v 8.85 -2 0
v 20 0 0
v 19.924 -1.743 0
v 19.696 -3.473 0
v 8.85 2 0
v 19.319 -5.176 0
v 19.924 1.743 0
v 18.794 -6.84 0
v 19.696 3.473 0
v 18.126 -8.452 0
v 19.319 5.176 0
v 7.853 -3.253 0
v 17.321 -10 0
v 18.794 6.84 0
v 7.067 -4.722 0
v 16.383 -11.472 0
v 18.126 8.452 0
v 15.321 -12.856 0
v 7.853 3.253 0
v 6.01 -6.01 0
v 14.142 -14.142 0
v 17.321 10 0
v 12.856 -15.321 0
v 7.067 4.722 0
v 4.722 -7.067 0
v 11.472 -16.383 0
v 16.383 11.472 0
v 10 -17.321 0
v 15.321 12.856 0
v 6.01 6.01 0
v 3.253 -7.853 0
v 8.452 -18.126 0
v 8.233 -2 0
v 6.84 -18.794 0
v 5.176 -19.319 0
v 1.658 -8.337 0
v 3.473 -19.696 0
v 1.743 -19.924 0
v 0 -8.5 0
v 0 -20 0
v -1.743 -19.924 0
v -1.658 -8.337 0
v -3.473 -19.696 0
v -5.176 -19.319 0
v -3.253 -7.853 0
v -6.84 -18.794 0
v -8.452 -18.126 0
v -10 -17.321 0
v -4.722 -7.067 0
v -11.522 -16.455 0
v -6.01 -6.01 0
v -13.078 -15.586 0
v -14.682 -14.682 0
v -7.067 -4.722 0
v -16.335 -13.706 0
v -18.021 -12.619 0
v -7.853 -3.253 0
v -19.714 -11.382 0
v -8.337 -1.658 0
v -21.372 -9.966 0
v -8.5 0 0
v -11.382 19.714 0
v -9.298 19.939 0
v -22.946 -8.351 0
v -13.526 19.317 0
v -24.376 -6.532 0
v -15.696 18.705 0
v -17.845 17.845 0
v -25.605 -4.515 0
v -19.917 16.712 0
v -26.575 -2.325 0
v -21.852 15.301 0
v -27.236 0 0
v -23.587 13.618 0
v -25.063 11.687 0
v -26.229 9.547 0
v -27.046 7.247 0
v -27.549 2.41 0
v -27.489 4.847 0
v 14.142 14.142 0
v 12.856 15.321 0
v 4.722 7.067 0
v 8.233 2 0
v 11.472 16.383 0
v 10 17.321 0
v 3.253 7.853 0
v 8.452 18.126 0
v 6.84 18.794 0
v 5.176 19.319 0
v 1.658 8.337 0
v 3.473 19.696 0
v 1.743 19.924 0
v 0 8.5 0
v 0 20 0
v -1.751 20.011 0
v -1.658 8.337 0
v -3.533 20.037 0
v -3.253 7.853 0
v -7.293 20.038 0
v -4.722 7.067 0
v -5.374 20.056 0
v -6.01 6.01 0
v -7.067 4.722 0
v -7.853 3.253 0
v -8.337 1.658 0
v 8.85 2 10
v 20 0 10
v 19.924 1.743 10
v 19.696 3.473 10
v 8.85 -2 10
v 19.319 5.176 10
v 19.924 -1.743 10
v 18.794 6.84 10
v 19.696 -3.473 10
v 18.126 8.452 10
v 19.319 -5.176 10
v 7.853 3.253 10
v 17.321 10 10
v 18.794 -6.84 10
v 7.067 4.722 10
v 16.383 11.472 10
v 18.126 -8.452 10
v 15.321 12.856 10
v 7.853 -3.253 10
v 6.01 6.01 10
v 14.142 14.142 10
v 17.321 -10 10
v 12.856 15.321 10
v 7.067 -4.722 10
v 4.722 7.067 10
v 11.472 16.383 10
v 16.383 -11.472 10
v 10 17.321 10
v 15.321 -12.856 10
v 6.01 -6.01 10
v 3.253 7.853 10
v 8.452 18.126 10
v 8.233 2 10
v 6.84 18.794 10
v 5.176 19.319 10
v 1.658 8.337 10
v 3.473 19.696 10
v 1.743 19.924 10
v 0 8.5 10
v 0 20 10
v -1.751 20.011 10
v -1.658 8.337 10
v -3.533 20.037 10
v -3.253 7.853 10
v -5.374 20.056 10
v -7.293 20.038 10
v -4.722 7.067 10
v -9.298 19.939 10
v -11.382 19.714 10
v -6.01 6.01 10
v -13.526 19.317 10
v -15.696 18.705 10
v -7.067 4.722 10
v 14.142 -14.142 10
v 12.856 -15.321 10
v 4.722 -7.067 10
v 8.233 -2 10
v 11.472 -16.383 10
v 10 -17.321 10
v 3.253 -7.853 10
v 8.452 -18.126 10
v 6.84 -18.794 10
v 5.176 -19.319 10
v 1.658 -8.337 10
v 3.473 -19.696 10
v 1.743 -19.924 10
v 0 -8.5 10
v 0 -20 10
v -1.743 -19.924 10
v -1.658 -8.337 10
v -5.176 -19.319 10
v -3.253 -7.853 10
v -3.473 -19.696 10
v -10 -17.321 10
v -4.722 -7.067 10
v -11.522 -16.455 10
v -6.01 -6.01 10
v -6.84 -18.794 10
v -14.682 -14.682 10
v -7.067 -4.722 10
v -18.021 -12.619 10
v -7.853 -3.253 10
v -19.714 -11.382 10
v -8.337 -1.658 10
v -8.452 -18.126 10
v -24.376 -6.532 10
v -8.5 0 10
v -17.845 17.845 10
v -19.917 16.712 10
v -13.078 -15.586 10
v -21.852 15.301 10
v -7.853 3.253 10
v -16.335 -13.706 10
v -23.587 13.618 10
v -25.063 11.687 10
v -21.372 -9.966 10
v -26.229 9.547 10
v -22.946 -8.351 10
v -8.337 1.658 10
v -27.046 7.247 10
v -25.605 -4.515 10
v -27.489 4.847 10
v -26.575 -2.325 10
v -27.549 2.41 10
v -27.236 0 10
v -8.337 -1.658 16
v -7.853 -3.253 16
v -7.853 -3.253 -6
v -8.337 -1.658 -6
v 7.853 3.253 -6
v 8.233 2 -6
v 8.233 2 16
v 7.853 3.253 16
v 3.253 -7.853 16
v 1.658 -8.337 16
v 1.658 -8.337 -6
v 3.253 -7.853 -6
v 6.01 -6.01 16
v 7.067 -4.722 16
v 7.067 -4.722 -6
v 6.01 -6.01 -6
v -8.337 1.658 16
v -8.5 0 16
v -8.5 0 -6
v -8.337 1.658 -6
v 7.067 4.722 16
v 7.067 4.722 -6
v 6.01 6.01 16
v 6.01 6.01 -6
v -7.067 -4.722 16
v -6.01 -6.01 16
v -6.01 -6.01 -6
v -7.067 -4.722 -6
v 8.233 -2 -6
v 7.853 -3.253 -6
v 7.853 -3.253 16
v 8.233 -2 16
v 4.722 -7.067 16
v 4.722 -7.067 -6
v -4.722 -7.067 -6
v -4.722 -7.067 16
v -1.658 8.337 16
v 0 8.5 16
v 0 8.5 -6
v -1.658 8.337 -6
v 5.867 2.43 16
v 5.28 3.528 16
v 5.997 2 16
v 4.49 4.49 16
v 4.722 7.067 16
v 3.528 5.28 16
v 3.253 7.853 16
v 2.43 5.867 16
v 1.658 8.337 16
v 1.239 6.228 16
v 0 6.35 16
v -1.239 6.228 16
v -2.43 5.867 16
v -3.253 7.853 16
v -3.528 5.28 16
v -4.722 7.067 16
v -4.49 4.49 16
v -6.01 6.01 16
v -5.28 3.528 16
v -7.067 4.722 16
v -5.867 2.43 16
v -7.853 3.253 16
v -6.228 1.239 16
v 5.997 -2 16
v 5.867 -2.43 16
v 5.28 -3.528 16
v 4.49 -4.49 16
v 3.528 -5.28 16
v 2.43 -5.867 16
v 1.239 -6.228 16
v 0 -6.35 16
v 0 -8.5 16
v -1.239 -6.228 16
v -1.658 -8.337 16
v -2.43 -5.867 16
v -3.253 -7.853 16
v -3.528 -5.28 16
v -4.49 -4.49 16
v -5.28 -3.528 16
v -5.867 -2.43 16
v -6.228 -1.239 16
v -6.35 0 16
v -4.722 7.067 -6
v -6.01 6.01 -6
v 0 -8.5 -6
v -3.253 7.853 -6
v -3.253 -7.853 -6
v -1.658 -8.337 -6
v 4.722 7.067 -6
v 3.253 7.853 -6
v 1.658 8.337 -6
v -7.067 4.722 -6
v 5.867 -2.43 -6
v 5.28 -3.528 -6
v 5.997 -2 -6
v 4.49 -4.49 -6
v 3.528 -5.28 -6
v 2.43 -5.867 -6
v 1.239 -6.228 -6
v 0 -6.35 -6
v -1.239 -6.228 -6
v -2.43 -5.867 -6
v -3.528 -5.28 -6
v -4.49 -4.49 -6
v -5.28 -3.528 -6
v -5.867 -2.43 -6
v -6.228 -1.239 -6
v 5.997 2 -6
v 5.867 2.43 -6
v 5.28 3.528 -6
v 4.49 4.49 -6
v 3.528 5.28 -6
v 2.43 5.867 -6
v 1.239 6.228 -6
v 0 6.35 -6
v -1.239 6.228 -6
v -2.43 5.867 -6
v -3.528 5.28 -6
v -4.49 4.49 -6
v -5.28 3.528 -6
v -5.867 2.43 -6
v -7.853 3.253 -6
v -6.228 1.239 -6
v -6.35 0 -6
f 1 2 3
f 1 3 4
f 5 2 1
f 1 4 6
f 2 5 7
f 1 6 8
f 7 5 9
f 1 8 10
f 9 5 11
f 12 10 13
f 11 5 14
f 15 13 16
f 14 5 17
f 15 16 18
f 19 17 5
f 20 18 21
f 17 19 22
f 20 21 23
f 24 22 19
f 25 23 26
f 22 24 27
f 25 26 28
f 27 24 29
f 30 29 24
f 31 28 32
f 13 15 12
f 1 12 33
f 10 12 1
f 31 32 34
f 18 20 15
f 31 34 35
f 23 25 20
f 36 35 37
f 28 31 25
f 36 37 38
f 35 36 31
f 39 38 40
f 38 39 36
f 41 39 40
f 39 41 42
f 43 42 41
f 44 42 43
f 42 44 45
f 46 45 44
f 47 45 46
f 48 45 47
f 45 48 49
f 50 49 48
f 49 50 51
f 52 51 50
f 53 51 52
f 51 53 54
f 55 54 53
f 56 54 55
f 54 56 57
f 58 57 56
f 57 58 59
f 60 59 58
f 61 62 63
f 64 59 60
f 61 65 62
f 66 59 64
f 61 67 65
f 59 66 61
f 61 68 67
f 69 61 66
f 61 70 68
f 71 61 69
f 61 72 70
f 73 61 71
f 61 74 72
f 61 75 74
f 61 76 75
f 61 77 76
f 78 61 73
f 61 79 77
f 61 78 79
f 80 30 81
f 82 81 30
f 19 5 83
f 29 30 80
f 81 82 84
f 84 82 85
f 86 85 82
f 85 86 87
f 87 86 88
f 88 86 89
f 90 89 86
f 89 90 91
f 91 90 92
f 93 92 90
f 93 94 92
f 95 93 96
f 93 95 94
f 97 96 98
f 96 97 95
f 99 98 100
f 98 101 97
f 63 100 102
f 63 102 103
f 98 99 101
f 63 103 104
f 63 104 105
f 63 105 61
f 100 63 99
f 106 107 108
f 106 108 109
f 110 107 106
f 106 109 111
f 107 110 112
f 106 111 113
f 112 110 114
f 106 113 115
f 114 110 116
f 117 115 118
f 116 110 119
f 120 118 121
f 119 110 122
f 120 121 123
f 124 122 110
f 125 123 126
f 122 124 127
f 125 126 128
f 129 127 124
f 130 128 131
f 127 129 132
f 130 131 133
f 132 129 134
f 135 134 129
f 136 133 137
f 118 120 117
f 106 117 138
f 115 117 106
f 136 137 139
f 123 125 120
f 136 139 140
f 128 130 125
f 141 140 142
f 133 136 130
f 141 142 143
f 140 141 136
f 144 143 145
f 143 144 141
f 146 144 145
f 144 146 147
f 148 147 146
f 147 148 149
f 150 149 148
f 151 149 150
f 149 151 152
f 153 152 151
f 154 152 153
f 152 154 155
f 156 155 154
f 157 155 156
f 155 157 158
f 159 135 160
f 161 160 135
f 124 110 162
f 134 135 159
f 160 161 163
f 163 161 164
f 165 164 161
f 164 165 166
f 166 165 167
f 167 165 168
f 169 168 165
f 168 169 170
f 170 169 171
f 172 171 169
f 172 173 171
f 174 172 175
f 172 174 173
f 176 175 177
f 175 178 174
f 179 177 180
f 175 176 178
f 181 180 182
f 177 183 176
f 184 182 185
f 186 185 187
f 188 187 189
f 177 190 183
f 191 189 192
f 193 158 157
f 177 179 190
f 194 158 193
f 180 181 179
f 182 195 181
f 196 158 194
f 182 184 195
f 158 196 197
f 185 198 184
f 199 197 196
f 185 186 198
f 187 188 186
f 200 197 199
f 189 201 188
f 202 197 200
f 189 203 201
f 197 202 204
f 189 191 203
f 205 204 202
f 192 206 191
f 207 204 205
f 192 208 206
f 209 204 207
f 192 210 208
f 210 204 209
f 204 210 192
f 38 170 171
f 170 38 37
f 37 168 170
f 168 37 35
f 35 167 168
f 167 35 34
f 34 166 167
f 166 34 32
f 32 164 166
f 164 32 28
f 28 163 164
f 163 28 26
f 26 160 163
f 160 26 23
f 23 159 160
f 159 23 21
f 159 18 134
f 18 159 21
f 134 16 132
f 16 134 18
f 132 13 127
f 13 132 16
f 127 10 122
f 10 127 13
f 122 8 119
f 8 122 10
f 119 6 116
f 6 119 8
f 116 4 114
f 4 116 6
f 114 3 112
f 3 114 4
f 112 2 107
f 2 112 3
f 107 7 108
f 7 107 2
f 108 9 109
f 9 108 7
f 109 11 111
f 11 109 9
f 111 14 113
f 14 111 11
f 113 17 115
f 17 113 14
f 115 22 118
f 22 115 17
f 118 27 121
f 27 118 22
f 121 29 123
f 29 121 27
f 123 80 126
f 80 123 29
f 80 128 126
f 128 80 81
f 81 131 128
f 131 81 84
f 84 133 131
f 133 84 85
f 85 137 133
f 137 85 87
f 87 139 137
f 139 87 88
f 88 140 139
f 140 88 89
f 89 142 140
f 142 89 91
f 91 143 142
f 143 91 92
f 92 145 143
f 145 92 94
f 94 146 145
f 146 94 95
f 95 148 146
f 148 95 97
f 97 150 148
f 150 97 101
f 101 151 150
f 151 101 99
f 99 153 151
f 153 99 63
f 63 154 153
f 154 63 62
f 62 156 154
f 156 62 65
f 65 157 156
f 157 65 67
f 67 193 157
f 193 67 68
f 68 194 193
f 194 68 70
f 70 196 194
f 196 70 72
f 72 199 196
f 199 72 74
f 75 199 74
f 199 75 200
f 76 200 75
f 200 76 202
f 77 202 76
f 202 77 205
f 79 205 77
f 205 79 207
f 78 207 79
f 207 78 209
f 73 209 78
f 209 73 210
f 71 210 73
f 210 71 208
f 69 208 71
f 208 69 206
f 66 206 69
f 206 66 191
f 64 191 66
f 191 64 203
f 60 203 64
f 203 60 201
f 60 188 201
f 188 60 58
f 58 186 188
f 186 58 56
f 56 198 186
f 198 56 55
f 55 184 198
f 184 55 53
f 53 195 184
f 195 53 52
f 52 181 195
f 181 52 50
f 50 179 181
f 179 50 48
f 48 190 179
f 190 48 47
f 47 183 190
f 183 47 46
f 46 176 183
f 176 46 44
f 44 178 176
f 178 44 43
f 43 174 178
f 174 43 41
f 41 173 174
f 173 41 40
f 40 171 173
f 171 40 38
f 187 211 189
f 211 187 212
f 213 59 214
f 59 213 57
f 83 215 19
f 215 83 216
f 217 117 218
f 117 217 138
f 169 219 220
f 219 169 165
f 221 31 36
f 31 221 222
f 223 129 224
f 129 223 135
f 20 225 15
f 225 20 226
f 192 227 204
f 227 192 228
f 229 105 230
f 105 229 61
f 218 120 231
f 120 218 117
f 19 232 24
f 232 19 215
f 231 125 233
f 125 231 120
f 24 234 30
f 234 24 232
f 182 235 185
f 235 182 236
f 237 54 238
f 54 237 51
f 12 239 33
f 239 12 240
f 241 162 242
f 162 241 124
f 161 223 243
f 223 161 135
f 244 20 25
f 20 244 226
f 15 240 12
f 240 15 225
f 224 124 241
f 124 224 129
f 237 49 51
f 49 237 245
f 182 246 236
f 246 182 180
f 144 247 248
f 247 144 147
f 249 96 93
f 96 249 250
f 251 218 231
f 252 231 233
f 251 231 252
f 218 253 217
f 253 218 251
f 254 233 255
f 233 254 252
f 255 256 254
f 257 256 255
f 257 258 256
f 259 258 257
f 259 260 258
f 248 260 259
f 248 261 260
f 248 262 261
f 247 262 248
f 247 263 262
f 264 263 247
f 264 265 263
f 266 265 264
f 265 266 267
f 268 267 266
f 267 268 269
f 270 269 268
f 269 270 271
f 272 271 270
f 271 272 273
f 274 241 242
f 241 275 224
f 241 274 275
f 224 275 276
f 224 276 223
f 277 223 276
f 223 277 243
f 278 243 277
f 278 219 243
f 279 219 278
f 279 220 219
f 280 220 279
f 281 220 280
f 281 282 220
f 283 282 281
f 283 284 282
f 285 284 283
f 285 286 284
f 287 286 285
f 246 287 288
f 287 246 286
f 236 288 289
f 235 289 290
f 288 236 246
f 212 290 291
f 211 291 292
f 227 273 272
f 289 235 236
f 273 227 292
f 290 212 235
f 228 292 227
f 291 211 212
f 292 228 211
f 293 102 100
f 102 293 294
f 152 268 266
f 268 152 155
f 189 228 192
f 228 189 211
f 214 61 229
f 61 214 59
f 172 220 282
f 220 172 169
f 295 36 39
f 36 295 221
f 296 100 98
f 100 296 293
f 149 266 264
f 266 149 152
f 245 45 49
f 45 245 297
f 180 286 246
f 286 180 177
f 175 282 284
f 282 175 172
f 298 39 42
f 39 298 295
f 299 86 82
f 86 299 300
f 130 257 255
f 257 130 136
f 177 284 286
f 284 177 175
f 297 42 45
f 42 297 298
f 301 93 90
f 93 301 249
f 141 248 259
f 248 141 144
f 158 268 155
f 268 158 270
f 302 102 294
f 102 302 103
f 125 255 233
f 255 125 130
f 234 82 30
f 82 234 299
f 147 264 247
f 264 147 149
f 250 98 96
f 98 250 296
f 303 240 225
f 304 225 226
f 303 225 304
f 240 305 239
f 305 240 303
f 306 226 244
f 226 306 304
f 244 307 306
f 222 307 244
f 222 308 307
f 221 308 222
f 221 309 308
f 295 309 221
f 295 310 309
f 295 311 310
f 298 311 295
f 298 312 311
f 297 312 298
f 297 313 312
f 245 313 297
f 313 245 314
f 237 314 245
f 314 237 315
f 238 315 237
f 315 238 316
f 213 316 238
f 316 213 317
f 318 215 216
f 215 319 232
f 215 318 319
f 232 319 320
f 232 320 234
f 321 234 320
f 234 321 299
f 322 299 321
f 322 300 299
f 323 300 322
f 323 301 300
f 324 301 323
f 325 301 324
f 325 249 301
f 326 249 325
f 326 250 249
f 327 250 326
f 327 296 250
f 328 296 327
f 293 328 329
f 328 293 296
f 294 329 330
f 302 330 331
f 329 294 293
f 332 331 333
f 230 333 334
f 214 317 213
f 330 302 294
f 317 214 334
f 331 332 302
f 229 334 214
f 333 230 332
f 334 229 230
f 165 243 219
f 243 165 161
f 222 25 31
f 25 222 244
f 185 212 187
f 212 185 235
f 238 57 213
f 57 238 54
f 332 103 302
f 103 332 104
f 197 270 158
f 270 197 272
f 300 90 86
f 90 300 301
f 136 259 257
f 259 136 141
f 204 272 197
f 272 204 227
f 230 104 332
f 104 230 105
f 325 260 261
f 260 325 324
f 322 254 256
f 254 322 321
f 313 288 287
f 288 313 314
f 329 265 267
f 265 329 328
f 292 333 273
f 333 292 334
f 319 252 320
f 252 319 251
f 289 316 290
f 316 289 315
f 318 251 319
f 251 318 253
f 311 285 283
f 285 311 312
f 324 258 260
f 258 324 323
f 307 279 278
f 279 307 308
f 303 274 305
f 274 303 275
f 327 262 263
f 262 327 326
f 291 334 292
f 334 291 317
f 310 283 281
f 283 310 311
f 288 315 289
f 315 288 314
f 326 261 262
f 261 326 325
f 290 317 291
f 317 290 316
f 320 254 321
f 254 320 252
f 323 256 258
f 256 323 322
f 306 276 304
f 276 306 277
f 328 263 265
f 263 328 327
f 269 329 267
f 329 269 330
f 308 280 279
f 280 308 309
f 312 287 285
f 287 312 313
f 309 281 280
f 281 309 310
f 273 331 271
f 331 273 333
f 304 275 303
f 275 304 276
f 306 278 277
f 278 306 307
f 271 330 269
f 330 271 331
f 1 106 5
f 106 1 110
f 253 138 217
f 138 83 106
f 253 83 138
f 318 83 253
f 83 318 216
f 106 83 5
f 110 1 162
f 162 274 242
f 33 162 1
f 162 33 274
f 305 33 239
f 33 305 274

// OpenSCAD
$fn = 32;

// ----------------------------------------------------------------------
// Cam: base radius 20 mm with a 8 mm lift over 150 degrees
// ----------------------------------------------------------------------

// --- parameters (mm) ---
base_r = 20;              // base radius
lift = 8;                 // lift height above the base radius
lift_span = 150;          // angular width of the lift
lift_start = 90;          // angle where the lift starts
cam_t = 10;               // cam plate thickness
hub_d = 17;               // hub diameter
hub_h = 22;               // hub height
bore_d = 12.7;            // bore
key_w = 4;                // keyway width
key_depth = 1.6;          // keyway depth

cam_profile = [[20, 0], [19.924, 1.743], [19.696, 3.473], [19.319, 5.176], [18.794, 6.84], [18.126, 8.452], [17.321, 10], [16.383, 11.472], [15.321, 12.856], [14.142, 14.142], [12.856, 15.321], [11.472, 16.383], [10, 17.321], [8.452, 18.126], [6.84, 18.794], [5.176, 19.319], [3.473, 19.696], [1.743, 19.924], [0, 20], [-1.751, 20.011], [-3.533, 20.037], [-5.374, 20.056], [-7.293, 20.038], [-9.298, 19.939], [-11.382, 19.714], [-13.526, 19.317], [-15.696, 18.705], [-17.845, 17.845], [-19.917, 16.712], [-21.852, 15.301], [-23.587, 13.618], [-25.063, 11.687], [-26.229, 9.547], [-27.046, 7.247], [-27.489, 4.847], [-27.549, 2.41], [-27.236, 0], [-26.575, -2.325], [-25.605, -4.515], [-24.376, -6.532], [-22.946, -8.351], [-21.372, -9.966], [-19.714, -11.382], [-18.021, -12.619], [-16.335, -13.706], [-14.682, -14.682], [-13.078, -15.586], [-11.522, -16.455], [-10, -17.321], [-8.452, -18.126], [-6.84, -18.794], [-5.176, -19.319], [-3.473, -19.696], [-1.743, -19.924], [0, -20], [1.743, -19.924], [3.473, -19.696], [5.176, -19.319], [6.84, -18.794], [8.452, -18.126], [10, -17.321], [11.472, -16.383], [12.856, -15.321], [14.142, -14.142], [15.321, -12.856], [16.383, -11.472], [17.321, -10], [18.126, -8.452], [18.794, -6.84], [19.319, -5.176], [19.696, -3.473], [19.924, -1.743]];

difference() {
  union() {
    linear_extrude(height = cam_t) polygon(cam_profile);
    /* hub, proud of the cam plate on both sides */
    translate([0, 0, -6]) cylinder(h = hub_h, d = hub_d);
  }
  /* bore through the hub, 2.5 mm clear on both faces */
  translate([0, 0, -8.5]) cylinder(h = hub_h + 5, d = bore_d);
  /* keyway, milled through the whole hub */
  translate([4.75, -2, -8.5]) cube([4.1, 4, 27]);
}
